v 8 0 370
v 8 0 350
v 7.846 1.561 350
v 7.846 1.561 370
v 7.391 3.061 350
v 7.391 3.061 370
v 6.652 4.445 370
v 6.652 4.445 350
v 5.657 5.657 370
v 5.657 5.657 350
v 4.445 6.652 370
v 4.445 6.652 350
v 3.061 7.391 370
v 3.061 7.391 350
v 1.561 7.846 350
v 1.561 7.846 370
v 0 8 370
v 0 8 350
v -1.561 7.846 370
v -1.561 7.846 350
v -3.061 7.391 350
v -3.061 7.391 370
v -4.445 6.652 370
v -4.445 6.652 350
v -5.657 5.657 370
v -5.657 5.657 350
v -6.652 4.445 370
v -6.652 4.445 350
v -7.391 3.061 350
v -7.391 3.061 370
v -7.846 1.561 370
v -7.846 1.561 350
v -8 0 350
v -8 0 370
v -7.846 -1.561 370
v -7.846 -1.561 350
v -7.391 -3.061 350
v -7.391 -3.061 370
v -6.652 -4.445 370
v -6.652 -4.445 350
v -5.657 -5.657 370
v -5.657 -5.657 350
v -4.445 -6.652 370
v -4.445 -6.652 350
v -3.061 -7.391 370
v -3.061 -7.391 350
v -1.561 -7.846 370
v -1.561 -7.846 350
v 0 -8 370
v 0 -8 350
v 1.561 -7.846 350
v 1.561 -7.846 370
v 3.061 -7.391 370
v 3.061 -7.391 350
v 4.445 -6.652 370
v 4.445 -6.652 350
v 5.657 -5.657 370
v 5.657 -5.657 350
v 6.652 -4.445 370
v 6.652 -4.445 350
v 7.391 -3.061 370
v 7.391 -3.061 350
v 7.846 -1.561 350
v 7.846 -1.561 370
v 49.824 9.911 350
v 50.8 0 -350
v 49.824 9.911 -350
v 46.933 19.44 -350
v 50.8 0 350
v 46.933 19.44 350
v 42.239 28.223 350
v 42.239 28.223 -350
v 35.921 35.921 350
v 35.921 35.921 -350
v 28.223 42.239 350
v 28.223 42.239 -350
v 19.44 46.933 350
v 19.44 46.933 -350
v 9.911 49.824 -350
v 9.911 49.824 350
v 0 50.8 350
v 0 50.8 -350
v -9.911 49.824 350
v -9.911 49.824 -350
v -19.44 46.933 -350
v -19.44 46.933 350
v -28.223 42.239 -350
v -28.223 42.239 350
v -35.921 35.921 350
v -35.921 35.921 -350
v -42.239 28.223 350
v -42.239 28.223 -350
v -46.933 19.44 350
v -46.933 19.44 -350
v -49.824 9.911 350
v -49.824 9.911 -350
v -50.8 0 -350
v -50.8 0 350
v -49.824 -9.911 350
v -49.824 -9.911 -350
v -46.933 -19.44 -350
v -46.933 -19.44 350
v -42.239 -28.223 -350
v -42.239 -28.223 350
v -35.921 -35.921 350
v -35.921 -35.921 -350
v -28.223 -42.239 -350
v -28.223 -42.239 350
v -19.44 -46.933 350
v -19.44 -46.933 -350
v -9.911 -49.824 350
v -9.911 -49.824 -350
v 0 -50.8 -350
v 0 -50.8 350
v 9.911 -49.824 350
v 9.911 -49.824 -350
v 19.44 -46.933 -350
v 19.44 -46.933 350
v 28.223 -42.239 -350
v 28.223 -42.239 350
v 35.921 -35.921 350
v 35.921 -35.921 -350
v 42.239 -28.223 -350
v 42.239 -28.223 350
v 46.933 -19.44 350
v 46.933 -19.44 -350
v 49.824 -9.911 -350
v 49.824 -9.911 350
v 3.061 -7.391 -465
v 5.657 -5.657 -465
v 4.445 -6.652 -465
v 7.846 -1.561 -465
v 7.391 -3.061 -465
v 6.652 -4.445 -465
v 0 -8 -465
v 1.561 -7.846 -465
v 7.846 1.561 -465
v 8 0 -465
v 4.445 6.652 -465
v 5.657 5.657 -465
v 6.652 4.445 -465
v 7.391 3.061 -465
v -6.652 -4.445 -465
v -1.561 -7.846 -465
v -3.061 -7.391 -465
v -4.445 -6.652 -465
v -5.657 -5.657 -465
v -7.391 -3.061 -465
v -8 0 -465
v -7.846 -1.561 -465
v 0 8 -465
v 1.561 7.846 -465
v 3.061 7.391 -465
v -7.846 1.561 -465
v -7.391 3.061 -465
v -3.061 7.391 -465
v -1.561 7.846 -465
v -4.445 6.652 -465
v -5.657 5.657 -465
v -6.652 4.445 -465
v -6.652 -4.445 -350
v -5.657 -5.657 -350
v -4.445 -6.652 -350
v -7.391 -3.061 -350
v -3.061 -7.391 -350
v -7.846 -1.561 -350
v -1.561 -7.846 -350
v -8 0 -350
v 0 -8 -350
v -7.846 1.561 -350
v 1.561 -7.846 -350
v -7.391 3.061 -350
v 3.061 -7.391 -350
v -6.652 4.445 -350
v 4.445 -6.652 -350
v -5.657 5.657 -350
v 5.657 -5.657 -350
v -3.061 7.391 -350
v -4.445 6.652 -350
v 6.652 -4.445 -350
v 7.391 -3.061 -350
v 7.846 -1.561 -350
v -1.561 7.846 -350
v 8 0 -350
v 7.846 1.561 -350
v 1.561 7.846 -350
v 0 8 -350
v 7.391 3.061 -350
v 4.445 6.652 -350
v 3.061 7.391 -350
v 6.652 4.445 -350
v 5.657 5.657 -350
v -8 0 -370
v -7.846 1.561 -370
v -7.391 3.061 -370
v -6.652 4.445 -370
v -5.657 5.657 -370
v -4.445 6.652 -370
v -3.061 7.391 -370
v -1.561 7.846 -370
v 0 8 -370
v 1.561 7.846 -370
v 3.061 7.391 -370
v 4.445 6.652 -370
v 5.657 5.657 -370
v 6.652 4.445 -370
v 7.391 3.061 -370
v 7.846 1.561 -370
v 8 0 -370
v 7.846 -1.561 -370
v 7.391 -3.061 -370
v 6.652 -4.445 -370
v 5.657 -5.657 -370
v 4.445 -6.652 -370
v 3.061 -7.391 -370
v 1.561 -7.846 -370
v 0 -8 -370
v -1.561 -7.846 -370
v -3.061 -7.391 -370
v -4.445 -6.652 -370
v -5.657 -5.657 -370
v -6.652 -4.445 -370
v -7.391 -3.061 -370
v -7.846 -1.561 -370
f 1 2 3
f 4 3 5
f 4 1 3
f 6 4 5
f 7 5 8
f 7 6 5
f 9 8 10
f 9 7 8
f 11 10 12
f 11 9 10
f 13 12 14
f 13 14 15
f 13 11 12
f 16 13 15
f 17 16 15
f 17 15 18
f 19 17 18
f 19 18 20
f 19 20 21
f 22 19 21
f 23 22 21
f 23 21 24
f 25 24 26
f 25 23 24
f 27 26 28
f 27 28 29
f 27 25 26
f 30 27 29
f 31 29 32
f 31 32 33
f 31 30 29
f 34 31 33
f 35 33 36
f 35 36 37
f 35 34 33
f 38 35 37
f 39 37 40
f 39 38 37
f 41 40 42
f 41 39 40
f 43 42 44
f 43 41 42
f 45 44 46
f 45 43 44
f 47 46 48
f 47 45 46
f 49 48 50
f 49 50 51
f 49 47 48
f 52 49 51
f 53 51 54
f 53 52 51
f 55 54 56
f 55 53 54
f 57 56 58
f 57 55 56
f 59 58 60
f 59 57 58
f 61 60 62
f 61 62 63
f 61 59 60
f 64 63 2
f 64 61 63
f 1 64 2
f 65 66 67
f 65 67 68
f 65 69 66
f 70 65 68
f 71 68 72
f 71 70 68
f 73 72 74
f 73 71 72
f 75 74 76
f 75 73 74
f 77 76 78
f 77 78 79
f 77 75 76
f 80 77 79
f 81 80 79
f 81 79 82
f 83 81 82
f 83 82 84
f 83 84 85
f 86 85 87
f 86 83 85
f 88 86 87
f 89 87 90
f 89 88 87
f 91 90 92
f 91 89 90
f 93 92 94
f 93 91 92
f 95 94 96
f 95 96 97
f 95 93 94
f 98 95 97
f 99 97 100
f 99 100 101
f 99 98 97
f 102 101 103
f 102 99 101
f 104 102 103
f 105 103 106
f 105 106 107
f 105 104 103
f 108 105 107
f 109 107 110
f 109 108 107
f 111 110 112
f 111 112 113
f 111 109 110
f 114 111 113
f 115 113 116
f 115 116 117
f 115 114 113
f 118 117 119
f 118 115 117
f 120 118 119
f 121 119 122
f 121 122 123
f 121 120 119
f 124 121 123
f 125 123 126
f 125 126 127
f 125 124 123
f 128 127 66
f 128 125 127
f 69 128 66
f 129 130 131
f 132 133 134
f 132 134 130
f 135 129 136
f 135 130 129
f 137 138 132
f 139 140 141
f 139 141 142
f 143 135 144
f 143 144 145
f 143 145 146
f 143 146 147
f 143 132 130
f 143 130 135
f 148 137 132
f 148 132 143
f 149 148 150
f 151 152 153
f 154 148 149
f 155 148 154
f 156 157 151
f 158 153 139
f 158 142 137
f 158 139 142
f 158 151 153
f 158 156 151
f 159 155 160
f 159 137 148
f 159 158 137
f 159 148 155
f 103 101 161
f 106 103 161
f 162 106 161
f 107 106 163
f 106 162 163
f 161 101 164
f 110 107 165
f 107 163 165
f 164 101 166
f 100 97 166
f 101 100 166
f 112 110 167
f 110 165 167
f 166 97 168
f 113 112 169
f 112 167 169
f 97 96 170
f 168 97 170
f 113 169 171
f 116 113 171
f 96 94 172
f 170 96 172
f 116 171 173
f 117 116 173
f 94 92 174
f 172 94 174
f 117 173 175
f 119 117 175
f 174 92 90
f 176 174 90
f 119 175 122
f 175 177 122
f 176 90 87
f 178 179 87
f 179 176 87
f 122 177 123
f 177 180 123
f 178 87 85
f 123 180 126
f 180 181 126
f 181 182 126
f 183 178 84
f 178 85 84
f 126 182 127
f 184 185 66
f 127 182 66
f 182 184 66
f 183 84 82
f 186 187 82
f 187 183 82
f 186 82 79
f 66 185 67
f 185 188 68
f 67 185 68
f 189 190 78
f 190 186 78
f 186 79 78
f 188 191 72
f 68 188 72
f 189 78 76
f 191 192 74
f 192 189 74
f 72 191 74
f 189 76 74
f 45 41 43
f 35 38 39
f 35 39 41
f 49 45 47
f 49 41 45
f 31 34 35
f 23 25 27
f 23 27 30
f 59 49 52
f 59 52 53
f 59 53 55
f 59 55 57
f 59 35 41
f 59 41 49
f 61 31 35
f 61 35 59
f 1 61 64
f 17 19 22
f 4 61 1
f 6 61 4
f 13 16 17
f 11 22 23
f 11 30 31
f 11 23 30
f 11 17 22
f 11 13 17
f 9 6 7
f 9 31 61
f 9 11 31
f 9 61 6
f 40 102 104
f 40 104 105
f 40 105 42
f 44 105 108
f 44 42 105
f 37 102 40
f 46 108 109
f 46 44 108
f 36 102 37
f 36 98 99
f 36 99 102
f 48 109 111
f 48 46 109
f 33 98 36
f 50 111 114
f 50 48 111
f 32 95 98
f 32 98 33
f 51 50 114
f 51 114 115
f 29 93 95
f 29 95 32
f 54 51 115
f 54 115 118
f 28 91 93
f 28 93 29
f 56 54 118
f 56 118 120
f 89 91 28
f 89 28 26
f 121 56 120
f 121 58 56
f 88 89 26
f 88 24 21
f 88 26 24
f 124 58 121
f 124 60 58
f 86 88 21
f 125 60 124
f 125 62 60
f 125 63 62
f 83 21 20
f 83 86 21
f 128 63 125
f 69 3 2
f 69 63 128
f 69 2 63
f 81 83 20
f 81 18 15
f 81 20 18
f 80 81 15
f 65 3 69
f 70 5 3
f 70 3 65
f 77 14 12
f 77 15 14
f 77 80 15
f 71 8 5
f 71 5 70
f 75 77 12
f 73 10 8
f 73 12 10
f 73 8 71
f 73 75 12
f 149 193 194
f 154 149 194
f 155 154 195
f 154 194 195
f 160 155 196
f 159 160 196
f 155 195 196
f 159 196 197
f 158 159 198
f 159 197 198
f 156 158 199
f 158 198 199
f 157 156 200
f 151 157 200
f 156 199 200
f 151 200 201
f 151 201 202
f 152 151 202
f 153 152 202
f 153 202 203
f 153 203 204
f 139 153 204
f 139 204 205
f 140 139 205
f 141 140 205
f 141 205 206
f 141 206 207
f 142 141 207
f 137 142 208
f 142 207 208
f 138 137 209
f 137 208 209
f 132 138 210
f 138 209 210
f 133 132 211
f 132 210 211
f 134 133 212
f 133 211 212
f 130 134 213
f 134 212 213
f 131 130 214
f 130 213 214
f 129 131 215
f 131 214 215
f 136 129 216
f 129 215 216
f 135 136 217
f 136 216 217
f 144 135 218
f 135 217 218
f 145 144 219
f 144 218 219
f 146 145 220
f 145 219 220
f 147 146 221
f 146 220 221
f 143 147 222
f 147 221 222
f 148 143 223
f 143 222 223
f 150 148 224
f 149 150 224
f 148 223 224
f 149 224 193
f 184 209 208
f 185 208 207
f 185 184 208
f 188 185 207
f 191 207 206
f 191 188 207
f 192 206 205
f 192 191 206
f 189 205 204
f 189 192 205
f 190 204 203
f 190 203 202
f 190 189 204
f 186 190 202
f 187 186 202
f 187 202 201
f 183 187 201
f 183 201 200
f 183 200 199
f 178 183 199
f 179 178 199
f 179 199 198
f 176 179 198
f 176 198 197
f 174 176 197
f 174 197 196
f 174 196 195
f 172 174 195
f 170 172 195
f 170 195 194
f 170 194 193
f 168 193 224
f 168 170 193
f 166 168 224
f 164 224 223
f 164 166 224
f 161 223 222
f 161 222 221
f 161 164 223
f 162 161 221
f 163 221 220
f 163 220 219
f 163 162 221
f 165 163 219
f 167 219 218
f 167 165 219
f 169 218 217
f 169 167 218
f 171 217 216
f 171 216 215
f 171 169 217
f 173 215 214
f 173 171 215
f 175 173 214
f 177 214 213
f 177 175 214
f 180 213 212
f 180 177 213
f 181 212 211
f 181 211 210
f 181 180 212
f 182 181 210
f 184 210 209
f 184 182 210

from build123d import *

# Parameters (mm, degrees)
SKETCH1_R           = 50.8
BOSS_EXTRUDE1_DEPTH = 350
SKETCH2_R           = 8
BOSS_EXTRUDE2_DEPTH = 370
SKETCH3_R           = 8
BOSS_EXTRUDE3_DEPTH = 95


with BuildPart() as part:
    # Sketch1 → Boss-Extrude1 (new, symmetric)
    with BuildSketch(Plane.XY):
        Circle(SKETCH1_R)
    extrude(amount=BOSS_EXTRUDE1_DEPTH, both=True)

    # Sketch2 → Boss-Extrude2 (add, symmetric)
    with BuildSketch(Plane.XY):
        Circle(SKETCH2_R)
    extrude(amount=BOSS_EXTRUDE2_DEPTH, both=True)

    # Sketch3 → Boss-Extrude3 (add)
    with BuildSketch(Plane(origin=(0, 0, -370), x_dir=(-1, 0, 0), z_dir=(0, 0, -1))):
        Circle(SKETCH3_R)
    extrude(amount=BOSS_EXTRUDE3_DEPTH)


solid = part.part
